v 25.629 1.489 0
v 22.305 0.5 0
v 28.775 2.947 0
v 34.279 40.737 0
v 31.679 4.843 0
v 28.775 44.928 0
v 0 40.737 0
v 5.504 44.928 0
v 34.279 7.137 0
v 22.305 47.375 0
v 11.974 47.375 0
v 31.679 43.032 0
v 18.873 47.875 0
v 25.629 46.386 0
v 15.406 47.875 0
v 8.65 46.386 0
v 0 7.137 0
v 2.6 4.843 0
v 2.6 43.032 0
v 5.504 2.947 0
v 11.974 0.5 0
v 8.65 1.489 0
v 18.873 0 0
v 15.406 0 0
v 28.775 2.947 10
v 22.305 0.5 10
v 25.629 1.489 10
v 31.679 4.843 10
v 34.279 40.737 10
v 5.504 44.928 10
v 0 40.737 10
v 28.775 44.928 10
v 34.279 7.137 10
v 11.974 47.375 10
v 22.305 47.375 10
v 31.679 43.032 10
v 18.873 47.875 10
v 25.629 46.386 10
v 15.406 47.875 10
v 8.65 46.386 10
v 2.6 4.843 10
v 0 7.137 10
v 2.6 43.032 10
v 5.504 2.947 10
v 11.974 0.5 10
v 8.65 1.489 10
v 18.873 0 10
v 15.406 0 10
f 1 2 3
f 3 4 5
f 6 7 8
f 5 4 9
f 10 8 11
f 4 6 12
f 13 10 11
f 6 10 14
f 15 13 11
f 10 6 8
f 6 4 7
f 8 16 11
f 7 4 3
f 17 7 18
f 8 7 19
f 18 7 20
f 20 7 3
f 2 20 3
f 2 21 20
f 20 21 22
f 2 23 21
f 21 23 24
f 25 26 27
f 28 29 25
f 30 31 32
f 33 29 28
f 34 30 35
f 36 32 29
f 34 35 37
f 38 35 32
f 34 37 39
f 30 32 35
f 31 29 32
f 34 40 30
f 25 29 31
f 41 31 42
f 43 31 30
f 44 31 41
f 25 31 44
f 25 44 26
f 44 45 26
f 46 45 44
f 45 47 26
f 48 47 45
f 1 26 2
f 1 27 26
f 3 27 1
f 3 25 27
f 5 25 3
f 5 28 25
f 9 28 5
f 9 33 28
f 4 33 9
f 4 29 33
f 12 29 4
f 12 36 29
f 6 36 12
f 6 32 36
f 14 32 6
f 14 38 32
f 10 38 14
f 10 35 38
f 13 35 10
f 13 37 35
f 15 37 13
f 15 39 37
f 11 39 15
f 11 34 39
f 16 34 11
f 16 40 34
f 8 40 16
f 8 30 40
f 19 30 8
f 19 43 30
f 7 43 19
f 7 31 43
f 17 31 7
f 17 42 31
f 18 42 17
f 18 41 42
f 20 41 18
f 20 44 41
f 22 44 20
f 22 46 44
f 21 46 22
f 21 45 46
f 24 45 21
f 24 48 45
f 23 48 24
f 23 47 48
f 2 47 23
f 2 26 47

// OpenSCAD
$fn = 32;

// ----------------------------------------------------------------------
// Eccentric disc: double_d, 10 mm thick
// ----------------------------------------------------------------------

// --- parameters (mm) ---
profile_height = 10;      // extrusion height
profile_points = 24;      // points of the closed outline

profile = [[34.279, 40.737], [31.679, 43.032], [28.775, 44.928], [25.629, 46.386], [22.305, 47.375], [18.873, 47.875], [15.406, 47.875], [11.974, 47.375], [8.65, 46.386], [5.504, 44.928], [2.6, 43.032], [0, 40.737], [0, 7.137], [2.6, 4.843], [5.504, 2.947], [8.65, 1.489], [11.974, 0.5], [15.406, 0], [18.873, 0], [22.305, 0.5], [25.629, 1.489], [28.775, 2.947], [31.679, 4.843], [34.279, 7.137]];  // single closed polygon, 24 points, counter clockwise

// --- the one profile operation ---
linear_extrude(height = profile_height) polygon(points = profile);
